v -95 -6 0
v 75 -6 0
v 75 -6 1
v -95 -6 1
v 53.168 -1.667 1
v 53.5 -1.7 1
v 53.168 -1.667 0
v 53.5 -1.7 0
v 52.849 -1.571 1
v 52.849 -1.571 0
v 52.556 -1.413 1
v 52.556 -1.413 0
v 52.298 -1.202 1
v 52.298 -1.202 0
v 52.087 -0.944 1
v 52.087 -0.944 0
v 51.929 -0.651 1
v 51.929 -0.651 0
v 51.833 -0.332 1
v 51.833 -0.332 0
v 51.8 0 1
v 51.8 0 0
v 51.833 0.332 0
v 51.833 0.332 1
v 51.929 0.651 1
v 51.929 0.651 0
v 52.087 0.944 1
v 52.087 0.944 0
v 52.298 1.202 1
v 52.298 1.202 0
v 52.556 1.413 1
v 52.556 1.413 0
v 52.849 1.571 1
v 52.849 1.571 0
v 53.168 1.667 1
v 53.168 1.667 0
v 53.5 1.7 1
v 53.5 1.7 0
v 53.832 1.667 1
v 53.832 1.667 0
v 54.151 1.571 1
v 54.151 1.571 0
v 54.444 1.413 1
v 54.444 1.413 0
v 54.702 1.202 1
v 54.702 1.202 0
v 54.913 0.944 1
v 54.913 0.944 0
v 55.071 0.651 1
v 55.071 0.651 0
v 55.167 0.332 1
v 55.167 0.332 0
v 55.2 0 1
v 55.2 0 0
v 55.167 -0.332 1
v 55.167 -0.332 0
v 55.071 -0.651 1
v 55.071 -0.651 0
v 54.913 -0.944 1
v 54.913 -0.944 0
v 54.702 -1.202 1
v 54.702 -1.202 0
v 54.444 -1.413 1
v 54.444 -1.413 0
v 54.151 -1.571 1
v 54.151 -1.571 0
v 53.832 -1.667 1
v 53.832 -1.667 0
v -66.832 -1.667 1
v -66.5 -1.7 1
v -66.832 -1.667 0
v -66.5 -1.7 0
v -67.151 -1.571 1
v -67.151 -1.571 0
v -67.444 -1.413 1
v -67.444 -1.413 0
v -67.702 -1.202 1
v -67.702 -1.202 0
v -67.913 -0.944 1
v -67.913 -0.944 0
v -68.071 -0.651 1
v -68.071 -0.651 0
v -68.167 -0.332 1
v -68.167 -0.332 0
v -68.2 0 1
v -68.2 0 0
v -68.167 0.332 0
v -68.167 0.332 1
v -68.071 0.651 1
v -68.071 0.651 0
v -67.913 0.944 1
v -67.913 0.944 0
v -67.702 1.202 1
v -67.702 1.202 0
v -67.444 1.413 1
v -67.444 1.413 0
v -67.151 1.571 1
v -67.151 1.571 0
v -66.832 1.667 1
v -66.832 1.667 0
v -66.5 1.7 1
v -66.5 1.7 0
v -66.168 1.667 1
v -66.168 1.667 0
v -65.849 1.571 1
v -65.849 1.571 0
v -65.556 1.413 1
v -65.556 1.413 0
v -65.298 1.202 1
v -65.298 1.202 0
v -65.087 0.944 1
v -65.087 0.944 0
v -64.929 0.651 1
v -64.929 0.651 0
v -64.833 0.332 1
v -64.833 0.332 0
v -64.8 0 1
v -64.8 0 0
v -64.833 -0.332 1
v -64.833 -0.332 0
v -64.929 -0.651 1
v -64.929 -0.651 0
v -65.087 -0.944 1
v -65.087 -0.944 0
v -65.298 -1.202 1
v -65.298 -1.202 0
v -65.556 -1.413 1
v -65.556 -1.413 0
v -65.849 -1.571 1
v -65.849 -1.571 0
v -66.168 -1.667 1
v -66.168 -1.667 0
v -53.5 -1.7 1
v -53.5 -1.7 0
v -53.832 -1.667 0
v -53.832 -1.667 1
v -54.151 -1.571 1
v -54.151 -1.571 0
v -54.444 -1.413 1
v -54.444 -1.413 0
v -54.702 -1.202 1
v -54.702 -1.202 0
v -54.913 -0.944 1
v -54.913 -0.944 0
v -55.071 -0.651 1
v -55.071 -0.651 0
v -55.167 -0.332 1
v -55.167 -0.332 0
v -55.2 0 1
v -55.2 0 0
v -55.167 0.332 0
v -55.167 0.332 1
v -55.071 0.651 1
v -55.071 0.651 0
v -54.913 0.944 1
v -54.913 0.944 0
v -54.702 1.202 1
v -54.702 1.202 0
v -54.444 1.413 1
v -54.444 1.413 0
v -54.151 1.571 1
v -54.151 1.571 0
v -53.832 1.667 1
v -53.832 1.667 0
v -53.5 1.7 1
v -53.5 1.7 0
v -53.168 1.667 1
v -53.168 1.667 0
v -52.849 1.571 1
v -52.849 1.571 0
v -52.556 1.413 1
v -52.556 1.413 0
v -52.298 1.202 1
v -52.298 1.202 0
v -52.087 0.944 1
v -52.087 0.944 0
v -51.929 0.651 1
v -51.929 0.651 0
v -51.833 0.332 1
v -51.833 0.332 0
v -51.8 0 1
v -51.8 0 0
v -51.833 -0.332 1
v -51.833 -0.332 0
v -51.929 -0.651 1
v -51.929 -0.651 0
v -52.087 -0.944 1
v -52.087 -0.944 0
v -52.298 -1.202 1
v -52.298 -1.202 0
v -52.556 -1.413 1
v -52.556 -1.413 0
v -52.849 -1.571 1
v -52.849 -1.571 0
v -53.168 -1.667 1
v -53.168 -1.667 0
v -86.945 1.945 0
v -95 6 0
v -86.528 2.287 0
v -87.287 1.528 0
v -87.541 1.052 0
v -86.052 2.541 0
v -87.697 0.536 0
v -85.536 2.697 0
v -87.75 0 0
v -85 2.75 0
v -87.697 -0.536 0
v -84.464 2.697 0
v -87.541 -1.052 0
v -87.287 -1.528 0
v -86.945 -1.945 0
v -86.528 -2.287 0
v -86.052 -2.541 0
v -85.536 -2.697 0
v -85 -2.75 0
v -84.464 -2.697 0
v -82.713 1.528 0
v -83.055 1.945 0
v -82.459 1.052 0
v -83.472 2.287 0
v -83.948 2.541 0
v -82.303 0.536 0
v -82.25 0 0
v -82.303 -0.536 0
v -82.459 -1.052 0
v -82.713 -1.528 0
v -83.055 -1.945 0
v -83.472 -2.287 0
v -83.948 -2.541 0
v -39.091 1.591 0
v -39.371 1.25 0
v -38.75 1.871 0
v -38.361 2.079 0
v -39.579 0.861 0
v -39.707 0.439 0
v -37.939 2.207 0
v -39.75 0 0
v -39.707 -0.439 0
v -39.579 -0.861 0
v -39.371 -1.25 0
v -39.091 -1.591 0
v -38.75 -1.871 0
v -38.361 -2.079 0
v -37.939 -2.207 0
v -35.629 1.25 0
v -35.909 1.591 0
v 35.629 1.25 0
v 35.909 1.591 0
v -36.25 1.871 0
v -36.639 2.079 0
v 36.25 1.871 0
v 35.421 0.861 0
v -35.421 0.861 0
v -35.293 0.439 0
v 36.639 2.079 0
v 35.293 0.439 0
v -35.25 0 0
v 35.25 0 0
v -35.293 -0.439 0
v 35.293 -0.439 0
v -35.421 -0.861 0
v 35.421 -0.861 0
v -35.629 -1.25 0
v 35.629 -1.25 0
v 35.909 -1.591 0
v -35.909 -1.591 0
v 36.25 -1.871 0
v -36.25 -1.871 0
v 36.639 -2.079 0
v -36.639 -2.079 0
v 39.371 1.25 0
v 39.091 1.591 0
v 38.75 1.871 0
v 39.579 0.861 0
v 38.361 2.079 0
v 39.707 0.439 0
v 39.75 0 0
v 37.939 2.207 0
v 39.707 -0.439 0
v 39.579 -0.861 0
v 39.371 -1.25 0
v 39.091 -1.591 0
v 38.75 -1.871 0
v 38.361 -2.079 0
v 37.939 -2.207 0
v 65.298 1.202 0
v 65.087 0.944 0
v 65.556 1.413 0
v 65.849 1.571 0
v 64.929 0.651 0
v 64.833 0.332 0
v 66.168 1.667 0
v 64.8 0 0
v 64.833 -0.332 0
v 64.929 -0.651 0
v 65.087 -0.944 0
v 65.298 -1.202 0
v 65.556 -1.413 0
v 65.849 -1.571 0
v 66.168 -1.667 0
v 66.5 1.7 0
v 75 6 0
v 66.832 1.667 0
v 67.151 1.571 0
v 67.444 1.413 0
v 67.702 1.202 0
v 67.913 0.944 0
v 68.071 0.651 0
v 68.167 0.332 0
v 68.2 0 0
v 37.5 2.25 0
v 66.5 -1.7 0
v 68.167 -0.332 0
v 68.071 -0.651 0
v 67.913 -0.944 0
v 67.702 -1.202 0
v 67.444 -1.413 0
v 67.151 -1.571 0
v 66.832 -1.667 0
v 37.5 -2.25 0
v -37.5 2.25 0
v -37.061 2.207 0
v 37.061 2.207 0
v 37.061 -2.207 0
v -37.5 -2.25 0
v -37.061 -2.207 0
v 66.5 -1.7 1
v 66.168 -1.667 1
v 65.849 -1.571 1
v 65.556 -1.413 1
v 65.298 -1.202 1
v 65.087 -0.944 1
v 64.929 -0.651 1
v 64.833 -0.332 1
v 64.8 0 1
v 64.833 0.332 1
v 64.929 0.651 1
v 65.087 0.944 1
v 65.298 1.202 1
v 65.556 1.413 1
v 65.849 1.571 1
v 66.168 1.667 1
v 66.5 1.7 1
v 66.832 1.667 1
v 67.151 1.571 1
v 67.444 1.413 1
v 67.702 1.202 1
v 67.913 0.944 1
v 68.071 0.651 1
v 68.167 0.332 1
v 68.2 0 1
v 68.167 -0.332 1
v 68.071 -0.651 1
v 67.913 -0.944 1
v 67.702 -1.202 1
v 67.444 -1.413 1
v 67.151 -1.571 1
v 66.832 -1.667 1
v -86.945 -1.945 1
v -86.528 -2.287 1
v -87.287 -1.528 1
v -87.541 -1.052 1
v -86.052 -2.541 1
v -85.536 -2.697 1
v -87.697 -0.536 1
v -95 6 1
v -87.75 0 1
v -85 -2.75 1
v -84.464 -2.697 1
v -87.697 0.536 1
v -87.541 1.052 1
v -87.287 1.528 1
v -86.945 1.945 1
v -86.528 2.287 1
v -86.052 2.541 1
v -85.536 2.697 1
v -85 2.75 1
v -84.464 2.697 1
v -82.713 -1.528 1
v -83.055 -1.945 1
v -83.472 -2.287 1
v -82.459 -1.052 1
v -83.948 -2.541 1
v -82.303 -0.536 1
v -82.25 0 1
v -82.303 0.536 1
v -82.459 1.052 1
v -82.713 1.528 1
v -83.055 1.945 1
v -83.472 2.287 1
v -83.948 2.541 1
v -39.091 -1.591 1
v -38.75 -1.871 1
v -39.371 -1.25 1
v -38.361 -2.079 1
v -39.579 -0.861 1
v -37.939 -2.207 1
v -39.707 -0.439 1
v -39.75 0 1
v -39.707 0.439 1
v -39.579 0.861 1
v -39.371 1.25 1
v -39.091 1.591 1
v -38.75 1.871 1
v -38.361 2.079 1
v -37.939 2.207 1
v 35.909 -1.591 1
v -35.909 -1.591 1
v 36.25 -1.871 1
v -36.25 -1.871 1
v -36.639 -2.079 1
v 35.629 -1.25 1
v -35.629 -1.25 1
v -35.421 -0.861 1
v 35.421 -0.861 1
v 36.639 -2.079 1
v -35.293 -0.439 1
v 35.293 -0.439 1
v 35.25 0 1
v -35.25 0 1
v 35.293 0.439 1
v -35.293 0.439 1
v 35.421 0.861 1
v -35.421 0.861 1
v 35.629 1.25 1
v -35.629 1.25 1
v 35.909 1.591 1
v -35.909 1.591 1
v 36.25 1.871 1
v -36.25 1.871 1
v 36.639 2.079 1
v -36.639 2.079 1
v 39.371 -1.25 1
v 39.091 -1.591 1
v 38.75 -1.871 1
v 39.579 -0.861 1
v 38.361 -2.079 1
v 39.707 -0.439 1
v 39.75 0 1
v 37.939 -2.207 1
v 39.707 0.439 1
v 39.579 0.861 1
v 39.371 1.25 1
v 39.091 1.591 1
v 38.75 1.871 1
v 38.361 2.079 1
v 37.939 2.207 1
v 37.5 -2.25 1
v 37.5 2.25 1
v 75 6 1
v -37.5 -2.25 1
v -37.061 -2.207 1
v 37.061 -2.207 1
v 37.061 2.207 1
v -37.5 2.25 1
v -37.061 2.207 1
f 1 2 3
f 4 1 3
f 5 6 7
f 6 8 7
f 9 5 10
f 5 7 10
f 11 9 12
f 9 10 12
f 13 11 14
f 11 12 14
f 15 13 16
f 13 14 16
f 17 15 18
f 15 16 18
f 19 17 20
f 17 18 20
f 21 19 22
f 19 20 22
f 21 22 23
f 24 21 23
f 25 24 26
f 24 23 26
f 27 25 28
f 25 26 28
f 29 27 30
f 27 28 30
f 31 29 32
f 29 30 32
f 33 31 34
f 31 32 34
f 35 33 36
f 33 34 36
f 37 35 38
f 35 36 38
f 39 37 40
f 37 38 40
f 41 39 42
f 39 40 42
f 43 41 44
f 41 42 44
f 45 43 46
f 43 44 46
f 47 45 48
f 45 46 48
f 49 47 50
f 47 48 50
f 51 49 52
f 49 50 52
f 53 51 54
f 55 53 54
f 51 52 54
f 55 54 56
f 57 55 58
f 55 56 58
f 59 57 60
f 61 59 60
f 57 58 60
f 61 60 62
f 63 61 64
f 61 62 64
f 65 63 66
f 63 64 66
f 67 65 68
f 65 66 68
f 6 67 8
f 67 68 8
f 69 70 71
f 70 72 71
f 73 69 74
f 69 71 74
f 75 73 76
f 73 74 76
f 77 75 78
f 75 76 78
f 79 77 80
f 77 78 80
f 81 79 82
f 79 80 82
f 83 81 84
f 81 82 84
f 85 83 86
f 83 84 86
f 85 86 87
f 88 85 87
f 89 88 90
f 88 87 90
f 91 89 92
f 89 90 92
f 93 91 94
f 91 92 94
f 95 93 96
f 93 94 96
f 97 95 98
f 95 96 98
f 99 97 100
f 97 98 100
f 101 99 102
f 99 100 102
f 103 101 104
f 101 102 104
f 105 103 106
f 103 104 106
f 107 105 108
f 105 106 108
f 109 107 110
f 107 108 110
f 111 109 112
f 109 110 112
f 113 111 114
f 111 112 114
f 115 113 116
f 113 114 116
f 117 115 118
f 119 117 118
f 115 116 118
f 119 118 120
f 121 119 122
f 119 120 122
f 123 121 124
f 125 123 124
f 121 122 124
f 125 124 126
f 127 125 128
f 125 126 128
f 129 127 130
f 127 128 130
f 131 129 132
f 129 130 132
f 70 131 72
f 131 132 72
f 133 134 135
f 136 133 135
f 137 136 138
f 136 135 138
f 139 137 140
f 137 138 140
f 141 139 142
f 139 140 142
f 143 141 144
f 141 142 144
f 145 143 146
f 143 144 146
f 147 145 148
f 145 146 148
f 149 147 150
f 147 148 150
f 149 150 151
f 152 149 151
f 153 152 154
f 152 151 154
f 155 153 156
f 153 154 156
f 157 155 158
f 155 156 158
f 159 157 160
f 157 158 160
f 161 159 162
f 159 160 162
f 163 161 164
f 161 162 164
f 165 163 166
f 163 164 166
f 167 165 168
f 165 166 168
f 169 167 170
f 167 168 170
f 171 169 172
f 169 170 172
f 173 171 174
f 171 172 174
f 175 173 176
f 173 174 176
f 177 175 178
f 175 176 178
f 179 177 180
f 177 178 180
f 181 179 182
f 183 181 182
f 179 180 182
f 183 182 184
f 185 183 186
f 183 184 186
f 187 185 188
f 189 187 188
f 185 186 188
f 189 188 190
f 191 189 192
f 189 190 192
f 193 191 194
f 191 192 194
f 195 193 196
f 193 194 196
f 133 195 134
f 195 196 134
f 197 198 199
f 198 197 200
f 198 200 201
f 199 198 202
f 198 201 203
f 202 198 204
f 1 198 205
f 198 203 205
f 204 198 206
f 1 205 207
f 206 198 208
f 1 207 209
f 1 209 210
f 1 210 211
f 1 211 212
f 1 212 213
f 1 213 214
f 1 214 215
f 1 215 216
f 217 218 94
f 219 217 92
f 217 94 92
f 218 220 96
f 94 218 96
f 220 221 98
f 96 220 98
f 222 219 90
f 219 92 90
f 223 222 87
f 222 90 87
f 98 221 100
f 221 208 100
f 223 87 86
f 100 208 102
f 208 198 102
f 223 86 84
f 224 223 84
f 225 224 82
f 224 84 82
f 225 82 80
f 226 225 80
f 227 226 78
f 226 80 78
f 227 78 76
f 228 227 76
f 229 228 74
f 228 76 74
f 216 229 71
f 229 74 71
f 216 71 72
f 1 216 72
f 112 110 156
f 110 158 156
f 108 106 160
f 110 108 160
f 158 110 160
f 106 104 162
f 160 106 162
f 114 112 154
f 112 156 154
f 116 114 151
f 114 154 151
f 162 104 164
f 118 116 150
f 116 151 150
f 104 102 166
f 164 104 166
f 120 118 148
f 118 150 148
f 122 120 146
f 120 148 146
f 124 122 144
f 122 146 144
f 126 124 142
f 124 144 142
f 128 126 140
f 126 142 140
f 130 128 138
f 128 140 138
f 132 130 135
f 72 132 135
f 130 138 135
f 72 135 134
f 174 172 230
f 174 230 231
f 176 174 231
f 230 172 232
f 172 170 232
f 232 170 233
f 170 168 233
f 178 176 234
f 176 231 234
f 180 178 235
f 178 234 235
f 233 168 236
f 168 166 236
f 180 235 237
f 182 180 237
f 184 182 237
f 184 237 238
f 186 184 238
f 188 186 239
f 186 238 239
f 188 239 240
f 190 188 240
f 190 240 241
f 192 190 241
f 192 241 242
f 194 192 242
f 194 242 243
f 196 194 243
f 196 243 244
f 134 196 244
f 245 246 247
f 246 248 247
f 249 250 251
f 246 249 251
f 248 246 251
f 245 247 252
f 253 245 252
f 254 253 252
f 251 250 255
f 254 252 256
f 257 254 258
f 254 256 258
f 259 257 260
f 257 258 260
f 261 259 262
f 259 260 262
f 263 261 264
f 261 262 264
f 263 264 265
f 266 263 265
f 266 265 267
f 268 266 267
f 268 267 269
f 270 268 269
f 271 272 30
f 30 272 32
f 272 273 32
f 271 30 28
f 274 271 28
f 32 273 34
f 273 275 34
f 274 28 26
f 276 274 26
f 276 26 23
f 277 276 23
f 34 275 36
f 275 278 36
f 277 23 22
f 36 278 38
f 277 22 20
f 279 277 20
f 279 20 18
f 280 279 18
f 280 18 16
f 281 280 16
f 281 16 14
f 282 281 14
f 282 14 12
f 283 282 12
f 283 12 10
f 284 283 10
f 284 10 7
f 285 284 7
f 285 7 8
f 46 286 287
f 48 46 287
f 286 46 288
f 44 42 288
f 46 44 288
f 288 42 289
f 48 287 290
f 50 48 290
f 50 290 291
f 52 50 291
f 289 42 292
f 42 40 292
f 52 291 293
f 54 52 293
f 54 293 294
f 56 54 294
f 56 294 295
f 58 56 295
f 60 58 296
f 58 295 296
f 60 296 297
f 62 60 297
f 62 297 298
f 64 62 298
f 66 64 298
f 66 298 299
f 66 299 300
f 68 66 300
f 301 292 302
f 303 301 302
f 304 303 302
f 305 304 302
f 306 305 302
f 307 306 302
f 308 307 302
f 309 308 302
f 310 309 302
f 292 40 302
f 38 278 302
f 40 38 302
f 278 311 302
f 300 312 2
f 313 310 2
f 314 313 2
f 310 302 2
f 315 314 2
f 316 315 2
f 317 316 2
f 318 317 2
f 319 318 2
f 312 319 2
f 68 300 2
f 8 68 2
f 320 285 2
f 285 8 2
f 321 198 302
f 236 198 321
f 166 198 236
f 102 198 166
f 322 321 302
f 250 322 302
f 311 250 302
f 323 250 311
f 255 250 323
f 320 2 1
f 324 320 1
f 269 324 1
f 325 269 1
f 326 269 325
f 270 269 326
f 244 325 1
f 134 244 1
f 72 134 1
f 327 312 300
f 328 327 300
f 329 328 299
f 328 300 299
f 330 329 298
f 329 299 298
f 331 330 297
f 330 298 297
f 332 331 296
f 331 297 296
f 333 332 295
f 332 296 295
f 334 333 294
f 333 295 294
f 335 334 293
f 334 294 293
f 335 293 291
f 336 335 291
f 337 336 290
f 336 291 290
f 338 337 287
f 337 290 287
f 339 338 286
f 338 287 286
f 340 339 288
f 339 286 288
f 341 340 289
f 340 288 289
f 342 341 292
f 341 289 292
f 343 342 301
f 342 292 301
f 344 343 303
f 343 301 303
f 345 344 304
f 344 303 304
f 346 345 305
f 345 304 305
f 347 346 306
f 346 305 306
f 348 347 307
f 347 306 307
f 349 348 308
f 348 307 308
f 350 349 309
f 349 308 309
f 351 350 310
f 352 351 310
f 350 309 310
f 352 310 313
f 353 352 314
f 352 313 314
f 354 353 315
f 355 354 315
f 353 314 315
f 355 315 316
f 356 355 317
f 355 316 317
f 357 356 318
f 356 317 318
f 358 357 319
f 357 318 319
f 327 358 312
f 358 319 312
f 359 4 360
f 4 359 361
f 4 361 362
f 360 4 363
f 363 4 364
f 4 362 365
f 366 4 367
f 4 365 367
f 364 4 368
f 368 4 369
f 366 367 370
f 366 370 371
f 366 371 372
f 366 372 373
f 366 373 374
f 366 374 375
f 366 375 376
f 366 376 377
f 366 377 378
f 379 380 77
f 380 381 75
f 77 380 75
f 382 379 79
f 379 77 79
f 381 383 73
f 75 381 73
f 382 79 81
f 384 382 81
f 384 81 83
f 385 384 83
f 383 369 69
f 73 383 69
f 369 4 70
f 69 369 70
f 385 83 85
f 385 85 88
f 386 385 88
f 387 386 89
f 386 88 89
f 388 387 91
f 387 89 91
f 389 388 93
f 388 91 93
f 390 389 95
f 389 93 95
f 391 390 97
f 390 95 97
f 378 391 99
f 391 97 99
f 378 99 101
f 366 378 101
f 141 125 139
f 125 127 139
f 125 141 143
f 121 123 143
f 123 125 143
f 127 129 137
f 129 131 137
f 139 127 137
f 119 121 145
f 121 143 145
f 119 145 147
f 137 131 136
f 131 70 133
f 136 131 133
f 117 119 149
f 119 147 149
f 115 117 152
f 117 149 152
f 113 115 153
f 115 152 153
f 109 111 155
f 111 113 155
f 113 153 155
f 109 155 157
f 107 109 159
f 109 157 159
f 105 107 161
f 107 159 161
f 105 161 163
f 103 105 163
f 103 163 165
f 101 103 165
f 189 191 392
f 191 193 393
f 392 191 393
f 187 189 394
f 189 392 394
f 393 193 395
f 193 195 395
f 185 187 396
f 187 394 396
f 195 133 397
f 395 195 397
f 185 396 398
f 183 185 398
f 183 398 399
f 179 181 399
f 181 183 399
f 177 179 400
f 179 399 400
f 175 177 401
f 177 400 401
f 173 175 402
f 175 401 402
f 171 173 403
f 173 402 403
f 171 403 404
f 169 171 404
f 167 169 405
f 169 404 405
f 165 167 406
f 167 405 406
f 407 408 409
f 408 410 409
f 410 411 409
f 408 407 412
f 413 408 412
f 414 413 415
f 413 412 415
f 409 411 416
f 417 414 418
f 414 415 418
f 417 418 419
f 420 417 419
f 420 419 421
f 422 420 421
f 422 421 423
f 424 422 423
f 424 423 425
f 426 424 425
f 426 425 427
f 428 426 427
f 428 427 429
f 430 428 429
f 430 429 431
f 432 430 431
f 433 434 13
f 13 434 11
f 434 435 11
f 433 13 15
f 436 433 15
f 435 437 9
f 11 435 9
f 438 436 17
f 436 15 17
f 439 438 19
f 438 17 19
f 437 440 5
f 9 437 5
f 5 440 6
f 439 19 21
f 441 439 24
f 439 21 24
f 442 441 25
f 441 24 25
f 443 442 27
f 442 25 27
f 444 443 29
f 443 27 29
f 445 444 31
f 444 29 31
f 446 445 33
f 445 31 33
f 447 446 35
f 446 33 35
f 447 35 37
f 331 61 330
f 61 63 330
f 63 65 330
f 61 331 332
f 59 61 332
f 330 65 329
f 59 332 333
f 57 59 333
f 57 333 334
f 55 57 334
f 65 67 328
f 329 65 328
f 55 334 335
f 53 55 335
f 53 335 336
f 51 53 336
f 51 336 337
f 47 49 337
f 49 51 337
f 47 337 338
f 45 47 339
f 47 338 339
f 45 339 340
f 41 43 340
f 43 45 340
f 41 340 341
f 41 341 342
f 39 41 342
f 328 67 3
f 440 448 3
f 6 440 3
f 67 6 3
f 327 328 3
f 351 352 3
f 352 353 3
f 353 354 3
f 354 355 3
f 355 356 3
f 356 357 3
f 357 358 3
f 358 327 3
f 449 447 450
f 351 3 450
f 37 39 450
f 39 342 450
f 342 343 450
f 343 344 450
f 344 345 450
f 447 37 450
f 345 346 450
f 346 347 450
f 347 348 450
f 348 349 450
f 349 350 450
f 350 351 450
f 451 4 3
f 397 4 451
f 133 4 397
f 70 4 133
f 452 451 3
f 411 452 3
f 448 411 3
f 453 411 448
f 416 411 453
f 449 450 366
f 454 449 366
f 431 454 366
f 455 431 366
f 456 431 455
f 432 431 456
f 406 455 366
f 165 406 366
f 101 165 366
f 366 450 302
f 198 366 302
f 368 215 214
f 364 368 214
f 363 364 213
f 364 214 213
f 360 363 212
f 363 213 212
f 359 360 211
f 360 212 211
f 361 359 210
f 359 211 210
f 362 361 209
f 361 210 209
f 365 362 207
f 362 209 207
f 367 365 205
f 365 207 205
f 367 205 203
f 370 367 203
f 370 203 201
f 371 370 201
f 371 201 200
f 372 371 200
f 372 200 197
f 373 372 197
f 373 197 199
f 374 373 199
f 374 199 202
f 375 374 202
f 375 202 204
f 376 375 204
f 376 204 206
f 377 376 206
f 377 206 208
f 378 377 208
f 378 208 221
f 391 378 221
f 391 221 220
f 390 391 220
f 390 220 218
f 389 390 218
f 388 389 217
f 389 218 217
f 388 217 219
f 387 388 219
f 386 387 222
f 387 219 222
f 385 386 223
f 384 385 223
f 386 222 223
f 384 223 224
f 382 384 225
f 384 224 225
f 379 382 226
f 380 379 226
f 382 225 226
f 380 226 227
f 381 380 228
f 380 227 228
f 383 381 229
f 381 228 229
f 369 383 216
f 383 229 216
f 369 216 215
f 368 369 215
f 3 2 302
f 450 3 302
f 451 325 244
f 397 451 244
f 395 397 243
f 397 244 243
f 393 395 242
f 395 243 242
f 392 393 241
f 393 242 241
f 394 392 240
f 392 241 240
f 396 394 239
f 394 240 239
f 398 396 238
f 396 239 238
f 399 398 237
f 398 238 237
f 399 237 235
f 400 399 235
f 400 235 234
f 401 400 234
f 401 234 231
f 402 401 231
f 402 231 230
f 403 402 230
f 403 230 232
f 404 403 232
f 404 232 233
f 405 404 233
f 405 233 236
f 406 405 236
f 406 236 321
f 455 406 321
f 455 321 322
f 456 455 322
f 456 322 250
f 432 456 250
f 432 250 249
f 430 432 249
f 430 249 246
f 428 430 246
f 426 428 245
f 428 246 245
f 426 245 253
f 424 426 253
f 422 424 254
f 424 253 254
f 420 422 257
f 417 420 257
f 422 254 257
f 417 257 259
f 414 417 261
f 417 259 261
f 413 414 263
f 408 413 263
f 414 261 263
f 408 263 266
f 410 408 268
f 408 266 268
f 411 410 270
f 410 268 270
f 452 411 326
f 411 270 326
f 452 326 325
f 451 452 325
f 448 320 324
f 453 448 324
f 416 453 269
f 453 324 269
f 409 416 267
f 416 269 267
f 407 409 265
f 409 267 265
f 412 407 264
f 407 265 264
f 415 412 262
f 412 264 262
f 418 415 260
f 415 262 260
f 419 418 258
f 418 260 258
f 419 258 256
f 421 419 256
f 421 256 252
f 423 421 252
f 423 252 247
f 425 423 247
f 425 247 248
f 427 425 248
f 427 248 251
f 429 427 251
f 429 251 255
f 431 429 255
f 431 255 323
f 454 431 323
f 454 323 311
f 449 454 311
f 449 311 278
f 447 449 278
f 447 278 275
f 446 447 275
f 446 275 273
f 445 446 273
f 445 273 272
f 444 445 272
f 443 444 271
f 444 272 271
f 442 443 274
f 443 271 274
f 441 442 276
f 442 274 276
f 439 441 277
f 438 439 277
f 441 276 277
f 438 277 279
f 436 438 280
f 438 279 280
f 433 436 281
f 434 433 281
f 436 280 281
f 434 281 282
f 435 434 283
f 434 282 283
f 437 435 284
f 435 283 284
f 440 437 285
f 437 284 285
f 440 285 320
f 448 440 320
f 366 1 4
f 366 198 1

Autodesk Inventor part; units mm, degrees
ref_plane "YZ Plane" through (0, 0, 0) normal (1, 0, 0) x (0, 1, 0)
ref_plane "XZ Plane" through (0, 0, 0) normal (0, 1, 0) x (-1, 0, 0)
ref_plane "XY Plane" through (0, 0, 0) normal (0, 0, 1) x (1, 0, 0)
sketch "Sketch1" plane through (0, 0, 0) normal (0, 0, 1) x (1, 0, 0)
  line L0 (-75, -6) -> (75, -6)
  line L1 (75, -6) -> (75, 6)
  line L2 (75, 6) -> (-75, 6)
  line L3 (-75, 6) -> (-75, -6)
  line L4 (-75, -6) -> (75, 6) construction
  line L5 (75, -6) -> (-75, 6) construction
  point P0 (0, 0)
  dimension "d0" = 150
  dimension "d1" = 12
extrude "Extrusion1" add sketch "Sketch1" along normal blind 1
sketch "Sketch2" plane through (0, 0, 1) normal (0, 0, 1) x (1, 0, 0)
  line L0 (-66.5, 0) -> (-53.5, 0) construction
  line L1 (-53.5, 0) -> (53.5, 0) construction
  line L2 (53.5, 0) -> (66.5, 0) construction
  point P0 (0, 0)
  point P1 (0, 0)
  dimension "d4" = 133
  dimension "d5" = 13
  dimension "d6" = 13
hole "Hole1" at (-66.5, 0, 1) at (-53.5, 0, 1) at (66.5, 0, 1) at (53.5, 0, 1) direction (0, 0, -1) diameter 3.4 depth 8 tip angle 118 clearance for "Countersunk Flat Head Screw DIN EN ISO 2009" size "M3" standard "DIN"
sketch "Sketch4" plane through (0, 0, 1) normal (0, 0, 1) x (1, 0, 0)
  line L0 (-37.5, 0) -> (37.5, 0) construction
  point P0 (0, 0)
  point P1 (0, 0)
  dimension "d21" = 75
hole "Hole3" at (-37.5, 0, 1) at (37.5, 0, 1) direction (0, 0, -1) diameter 4.5 depth 8 tip angle 118 clearance for "Countersunk Flat Head Screw DIN EN ISO 2009" size "M4" standard "DIN"
sketch "Sketch6" plane through (-75, -6, 0) normal (-1, 0, 0) x (0, 0, 1)
  line L0 (1, 0) -> (1, 12) projected
  line L1 (0, 0) -> (1, 0)
  line L2 (1, 0) -> (1, 12)
  line L3 (1, 12) -> (0, 12)
  line L4 (0, 12) -> (0, 0)
  point P0 (0, 6)
extrude "Extrusion2" add sketch "Sketch6" along normal blind 20
sketch "Sketch7" plane through (0, 0, 1) normal (0, 0, 1) x (1, 0, 0)
  line L0 (-95, -6) -> (-95, 6) projected
  point P0 (0, 0)
  point P1 (-85, 0)
  dimension "d39" = 10
hole "Hole5" at (-85, 0, 1) direction (0, 0, -1) diameter 5.5 depth 8 tip angle 118 clearance for "Countersunk Flat Head Screw DIN EN ISO 2009" size "M5" standard "DIN"
properties part number "CU6" material "Copper"
